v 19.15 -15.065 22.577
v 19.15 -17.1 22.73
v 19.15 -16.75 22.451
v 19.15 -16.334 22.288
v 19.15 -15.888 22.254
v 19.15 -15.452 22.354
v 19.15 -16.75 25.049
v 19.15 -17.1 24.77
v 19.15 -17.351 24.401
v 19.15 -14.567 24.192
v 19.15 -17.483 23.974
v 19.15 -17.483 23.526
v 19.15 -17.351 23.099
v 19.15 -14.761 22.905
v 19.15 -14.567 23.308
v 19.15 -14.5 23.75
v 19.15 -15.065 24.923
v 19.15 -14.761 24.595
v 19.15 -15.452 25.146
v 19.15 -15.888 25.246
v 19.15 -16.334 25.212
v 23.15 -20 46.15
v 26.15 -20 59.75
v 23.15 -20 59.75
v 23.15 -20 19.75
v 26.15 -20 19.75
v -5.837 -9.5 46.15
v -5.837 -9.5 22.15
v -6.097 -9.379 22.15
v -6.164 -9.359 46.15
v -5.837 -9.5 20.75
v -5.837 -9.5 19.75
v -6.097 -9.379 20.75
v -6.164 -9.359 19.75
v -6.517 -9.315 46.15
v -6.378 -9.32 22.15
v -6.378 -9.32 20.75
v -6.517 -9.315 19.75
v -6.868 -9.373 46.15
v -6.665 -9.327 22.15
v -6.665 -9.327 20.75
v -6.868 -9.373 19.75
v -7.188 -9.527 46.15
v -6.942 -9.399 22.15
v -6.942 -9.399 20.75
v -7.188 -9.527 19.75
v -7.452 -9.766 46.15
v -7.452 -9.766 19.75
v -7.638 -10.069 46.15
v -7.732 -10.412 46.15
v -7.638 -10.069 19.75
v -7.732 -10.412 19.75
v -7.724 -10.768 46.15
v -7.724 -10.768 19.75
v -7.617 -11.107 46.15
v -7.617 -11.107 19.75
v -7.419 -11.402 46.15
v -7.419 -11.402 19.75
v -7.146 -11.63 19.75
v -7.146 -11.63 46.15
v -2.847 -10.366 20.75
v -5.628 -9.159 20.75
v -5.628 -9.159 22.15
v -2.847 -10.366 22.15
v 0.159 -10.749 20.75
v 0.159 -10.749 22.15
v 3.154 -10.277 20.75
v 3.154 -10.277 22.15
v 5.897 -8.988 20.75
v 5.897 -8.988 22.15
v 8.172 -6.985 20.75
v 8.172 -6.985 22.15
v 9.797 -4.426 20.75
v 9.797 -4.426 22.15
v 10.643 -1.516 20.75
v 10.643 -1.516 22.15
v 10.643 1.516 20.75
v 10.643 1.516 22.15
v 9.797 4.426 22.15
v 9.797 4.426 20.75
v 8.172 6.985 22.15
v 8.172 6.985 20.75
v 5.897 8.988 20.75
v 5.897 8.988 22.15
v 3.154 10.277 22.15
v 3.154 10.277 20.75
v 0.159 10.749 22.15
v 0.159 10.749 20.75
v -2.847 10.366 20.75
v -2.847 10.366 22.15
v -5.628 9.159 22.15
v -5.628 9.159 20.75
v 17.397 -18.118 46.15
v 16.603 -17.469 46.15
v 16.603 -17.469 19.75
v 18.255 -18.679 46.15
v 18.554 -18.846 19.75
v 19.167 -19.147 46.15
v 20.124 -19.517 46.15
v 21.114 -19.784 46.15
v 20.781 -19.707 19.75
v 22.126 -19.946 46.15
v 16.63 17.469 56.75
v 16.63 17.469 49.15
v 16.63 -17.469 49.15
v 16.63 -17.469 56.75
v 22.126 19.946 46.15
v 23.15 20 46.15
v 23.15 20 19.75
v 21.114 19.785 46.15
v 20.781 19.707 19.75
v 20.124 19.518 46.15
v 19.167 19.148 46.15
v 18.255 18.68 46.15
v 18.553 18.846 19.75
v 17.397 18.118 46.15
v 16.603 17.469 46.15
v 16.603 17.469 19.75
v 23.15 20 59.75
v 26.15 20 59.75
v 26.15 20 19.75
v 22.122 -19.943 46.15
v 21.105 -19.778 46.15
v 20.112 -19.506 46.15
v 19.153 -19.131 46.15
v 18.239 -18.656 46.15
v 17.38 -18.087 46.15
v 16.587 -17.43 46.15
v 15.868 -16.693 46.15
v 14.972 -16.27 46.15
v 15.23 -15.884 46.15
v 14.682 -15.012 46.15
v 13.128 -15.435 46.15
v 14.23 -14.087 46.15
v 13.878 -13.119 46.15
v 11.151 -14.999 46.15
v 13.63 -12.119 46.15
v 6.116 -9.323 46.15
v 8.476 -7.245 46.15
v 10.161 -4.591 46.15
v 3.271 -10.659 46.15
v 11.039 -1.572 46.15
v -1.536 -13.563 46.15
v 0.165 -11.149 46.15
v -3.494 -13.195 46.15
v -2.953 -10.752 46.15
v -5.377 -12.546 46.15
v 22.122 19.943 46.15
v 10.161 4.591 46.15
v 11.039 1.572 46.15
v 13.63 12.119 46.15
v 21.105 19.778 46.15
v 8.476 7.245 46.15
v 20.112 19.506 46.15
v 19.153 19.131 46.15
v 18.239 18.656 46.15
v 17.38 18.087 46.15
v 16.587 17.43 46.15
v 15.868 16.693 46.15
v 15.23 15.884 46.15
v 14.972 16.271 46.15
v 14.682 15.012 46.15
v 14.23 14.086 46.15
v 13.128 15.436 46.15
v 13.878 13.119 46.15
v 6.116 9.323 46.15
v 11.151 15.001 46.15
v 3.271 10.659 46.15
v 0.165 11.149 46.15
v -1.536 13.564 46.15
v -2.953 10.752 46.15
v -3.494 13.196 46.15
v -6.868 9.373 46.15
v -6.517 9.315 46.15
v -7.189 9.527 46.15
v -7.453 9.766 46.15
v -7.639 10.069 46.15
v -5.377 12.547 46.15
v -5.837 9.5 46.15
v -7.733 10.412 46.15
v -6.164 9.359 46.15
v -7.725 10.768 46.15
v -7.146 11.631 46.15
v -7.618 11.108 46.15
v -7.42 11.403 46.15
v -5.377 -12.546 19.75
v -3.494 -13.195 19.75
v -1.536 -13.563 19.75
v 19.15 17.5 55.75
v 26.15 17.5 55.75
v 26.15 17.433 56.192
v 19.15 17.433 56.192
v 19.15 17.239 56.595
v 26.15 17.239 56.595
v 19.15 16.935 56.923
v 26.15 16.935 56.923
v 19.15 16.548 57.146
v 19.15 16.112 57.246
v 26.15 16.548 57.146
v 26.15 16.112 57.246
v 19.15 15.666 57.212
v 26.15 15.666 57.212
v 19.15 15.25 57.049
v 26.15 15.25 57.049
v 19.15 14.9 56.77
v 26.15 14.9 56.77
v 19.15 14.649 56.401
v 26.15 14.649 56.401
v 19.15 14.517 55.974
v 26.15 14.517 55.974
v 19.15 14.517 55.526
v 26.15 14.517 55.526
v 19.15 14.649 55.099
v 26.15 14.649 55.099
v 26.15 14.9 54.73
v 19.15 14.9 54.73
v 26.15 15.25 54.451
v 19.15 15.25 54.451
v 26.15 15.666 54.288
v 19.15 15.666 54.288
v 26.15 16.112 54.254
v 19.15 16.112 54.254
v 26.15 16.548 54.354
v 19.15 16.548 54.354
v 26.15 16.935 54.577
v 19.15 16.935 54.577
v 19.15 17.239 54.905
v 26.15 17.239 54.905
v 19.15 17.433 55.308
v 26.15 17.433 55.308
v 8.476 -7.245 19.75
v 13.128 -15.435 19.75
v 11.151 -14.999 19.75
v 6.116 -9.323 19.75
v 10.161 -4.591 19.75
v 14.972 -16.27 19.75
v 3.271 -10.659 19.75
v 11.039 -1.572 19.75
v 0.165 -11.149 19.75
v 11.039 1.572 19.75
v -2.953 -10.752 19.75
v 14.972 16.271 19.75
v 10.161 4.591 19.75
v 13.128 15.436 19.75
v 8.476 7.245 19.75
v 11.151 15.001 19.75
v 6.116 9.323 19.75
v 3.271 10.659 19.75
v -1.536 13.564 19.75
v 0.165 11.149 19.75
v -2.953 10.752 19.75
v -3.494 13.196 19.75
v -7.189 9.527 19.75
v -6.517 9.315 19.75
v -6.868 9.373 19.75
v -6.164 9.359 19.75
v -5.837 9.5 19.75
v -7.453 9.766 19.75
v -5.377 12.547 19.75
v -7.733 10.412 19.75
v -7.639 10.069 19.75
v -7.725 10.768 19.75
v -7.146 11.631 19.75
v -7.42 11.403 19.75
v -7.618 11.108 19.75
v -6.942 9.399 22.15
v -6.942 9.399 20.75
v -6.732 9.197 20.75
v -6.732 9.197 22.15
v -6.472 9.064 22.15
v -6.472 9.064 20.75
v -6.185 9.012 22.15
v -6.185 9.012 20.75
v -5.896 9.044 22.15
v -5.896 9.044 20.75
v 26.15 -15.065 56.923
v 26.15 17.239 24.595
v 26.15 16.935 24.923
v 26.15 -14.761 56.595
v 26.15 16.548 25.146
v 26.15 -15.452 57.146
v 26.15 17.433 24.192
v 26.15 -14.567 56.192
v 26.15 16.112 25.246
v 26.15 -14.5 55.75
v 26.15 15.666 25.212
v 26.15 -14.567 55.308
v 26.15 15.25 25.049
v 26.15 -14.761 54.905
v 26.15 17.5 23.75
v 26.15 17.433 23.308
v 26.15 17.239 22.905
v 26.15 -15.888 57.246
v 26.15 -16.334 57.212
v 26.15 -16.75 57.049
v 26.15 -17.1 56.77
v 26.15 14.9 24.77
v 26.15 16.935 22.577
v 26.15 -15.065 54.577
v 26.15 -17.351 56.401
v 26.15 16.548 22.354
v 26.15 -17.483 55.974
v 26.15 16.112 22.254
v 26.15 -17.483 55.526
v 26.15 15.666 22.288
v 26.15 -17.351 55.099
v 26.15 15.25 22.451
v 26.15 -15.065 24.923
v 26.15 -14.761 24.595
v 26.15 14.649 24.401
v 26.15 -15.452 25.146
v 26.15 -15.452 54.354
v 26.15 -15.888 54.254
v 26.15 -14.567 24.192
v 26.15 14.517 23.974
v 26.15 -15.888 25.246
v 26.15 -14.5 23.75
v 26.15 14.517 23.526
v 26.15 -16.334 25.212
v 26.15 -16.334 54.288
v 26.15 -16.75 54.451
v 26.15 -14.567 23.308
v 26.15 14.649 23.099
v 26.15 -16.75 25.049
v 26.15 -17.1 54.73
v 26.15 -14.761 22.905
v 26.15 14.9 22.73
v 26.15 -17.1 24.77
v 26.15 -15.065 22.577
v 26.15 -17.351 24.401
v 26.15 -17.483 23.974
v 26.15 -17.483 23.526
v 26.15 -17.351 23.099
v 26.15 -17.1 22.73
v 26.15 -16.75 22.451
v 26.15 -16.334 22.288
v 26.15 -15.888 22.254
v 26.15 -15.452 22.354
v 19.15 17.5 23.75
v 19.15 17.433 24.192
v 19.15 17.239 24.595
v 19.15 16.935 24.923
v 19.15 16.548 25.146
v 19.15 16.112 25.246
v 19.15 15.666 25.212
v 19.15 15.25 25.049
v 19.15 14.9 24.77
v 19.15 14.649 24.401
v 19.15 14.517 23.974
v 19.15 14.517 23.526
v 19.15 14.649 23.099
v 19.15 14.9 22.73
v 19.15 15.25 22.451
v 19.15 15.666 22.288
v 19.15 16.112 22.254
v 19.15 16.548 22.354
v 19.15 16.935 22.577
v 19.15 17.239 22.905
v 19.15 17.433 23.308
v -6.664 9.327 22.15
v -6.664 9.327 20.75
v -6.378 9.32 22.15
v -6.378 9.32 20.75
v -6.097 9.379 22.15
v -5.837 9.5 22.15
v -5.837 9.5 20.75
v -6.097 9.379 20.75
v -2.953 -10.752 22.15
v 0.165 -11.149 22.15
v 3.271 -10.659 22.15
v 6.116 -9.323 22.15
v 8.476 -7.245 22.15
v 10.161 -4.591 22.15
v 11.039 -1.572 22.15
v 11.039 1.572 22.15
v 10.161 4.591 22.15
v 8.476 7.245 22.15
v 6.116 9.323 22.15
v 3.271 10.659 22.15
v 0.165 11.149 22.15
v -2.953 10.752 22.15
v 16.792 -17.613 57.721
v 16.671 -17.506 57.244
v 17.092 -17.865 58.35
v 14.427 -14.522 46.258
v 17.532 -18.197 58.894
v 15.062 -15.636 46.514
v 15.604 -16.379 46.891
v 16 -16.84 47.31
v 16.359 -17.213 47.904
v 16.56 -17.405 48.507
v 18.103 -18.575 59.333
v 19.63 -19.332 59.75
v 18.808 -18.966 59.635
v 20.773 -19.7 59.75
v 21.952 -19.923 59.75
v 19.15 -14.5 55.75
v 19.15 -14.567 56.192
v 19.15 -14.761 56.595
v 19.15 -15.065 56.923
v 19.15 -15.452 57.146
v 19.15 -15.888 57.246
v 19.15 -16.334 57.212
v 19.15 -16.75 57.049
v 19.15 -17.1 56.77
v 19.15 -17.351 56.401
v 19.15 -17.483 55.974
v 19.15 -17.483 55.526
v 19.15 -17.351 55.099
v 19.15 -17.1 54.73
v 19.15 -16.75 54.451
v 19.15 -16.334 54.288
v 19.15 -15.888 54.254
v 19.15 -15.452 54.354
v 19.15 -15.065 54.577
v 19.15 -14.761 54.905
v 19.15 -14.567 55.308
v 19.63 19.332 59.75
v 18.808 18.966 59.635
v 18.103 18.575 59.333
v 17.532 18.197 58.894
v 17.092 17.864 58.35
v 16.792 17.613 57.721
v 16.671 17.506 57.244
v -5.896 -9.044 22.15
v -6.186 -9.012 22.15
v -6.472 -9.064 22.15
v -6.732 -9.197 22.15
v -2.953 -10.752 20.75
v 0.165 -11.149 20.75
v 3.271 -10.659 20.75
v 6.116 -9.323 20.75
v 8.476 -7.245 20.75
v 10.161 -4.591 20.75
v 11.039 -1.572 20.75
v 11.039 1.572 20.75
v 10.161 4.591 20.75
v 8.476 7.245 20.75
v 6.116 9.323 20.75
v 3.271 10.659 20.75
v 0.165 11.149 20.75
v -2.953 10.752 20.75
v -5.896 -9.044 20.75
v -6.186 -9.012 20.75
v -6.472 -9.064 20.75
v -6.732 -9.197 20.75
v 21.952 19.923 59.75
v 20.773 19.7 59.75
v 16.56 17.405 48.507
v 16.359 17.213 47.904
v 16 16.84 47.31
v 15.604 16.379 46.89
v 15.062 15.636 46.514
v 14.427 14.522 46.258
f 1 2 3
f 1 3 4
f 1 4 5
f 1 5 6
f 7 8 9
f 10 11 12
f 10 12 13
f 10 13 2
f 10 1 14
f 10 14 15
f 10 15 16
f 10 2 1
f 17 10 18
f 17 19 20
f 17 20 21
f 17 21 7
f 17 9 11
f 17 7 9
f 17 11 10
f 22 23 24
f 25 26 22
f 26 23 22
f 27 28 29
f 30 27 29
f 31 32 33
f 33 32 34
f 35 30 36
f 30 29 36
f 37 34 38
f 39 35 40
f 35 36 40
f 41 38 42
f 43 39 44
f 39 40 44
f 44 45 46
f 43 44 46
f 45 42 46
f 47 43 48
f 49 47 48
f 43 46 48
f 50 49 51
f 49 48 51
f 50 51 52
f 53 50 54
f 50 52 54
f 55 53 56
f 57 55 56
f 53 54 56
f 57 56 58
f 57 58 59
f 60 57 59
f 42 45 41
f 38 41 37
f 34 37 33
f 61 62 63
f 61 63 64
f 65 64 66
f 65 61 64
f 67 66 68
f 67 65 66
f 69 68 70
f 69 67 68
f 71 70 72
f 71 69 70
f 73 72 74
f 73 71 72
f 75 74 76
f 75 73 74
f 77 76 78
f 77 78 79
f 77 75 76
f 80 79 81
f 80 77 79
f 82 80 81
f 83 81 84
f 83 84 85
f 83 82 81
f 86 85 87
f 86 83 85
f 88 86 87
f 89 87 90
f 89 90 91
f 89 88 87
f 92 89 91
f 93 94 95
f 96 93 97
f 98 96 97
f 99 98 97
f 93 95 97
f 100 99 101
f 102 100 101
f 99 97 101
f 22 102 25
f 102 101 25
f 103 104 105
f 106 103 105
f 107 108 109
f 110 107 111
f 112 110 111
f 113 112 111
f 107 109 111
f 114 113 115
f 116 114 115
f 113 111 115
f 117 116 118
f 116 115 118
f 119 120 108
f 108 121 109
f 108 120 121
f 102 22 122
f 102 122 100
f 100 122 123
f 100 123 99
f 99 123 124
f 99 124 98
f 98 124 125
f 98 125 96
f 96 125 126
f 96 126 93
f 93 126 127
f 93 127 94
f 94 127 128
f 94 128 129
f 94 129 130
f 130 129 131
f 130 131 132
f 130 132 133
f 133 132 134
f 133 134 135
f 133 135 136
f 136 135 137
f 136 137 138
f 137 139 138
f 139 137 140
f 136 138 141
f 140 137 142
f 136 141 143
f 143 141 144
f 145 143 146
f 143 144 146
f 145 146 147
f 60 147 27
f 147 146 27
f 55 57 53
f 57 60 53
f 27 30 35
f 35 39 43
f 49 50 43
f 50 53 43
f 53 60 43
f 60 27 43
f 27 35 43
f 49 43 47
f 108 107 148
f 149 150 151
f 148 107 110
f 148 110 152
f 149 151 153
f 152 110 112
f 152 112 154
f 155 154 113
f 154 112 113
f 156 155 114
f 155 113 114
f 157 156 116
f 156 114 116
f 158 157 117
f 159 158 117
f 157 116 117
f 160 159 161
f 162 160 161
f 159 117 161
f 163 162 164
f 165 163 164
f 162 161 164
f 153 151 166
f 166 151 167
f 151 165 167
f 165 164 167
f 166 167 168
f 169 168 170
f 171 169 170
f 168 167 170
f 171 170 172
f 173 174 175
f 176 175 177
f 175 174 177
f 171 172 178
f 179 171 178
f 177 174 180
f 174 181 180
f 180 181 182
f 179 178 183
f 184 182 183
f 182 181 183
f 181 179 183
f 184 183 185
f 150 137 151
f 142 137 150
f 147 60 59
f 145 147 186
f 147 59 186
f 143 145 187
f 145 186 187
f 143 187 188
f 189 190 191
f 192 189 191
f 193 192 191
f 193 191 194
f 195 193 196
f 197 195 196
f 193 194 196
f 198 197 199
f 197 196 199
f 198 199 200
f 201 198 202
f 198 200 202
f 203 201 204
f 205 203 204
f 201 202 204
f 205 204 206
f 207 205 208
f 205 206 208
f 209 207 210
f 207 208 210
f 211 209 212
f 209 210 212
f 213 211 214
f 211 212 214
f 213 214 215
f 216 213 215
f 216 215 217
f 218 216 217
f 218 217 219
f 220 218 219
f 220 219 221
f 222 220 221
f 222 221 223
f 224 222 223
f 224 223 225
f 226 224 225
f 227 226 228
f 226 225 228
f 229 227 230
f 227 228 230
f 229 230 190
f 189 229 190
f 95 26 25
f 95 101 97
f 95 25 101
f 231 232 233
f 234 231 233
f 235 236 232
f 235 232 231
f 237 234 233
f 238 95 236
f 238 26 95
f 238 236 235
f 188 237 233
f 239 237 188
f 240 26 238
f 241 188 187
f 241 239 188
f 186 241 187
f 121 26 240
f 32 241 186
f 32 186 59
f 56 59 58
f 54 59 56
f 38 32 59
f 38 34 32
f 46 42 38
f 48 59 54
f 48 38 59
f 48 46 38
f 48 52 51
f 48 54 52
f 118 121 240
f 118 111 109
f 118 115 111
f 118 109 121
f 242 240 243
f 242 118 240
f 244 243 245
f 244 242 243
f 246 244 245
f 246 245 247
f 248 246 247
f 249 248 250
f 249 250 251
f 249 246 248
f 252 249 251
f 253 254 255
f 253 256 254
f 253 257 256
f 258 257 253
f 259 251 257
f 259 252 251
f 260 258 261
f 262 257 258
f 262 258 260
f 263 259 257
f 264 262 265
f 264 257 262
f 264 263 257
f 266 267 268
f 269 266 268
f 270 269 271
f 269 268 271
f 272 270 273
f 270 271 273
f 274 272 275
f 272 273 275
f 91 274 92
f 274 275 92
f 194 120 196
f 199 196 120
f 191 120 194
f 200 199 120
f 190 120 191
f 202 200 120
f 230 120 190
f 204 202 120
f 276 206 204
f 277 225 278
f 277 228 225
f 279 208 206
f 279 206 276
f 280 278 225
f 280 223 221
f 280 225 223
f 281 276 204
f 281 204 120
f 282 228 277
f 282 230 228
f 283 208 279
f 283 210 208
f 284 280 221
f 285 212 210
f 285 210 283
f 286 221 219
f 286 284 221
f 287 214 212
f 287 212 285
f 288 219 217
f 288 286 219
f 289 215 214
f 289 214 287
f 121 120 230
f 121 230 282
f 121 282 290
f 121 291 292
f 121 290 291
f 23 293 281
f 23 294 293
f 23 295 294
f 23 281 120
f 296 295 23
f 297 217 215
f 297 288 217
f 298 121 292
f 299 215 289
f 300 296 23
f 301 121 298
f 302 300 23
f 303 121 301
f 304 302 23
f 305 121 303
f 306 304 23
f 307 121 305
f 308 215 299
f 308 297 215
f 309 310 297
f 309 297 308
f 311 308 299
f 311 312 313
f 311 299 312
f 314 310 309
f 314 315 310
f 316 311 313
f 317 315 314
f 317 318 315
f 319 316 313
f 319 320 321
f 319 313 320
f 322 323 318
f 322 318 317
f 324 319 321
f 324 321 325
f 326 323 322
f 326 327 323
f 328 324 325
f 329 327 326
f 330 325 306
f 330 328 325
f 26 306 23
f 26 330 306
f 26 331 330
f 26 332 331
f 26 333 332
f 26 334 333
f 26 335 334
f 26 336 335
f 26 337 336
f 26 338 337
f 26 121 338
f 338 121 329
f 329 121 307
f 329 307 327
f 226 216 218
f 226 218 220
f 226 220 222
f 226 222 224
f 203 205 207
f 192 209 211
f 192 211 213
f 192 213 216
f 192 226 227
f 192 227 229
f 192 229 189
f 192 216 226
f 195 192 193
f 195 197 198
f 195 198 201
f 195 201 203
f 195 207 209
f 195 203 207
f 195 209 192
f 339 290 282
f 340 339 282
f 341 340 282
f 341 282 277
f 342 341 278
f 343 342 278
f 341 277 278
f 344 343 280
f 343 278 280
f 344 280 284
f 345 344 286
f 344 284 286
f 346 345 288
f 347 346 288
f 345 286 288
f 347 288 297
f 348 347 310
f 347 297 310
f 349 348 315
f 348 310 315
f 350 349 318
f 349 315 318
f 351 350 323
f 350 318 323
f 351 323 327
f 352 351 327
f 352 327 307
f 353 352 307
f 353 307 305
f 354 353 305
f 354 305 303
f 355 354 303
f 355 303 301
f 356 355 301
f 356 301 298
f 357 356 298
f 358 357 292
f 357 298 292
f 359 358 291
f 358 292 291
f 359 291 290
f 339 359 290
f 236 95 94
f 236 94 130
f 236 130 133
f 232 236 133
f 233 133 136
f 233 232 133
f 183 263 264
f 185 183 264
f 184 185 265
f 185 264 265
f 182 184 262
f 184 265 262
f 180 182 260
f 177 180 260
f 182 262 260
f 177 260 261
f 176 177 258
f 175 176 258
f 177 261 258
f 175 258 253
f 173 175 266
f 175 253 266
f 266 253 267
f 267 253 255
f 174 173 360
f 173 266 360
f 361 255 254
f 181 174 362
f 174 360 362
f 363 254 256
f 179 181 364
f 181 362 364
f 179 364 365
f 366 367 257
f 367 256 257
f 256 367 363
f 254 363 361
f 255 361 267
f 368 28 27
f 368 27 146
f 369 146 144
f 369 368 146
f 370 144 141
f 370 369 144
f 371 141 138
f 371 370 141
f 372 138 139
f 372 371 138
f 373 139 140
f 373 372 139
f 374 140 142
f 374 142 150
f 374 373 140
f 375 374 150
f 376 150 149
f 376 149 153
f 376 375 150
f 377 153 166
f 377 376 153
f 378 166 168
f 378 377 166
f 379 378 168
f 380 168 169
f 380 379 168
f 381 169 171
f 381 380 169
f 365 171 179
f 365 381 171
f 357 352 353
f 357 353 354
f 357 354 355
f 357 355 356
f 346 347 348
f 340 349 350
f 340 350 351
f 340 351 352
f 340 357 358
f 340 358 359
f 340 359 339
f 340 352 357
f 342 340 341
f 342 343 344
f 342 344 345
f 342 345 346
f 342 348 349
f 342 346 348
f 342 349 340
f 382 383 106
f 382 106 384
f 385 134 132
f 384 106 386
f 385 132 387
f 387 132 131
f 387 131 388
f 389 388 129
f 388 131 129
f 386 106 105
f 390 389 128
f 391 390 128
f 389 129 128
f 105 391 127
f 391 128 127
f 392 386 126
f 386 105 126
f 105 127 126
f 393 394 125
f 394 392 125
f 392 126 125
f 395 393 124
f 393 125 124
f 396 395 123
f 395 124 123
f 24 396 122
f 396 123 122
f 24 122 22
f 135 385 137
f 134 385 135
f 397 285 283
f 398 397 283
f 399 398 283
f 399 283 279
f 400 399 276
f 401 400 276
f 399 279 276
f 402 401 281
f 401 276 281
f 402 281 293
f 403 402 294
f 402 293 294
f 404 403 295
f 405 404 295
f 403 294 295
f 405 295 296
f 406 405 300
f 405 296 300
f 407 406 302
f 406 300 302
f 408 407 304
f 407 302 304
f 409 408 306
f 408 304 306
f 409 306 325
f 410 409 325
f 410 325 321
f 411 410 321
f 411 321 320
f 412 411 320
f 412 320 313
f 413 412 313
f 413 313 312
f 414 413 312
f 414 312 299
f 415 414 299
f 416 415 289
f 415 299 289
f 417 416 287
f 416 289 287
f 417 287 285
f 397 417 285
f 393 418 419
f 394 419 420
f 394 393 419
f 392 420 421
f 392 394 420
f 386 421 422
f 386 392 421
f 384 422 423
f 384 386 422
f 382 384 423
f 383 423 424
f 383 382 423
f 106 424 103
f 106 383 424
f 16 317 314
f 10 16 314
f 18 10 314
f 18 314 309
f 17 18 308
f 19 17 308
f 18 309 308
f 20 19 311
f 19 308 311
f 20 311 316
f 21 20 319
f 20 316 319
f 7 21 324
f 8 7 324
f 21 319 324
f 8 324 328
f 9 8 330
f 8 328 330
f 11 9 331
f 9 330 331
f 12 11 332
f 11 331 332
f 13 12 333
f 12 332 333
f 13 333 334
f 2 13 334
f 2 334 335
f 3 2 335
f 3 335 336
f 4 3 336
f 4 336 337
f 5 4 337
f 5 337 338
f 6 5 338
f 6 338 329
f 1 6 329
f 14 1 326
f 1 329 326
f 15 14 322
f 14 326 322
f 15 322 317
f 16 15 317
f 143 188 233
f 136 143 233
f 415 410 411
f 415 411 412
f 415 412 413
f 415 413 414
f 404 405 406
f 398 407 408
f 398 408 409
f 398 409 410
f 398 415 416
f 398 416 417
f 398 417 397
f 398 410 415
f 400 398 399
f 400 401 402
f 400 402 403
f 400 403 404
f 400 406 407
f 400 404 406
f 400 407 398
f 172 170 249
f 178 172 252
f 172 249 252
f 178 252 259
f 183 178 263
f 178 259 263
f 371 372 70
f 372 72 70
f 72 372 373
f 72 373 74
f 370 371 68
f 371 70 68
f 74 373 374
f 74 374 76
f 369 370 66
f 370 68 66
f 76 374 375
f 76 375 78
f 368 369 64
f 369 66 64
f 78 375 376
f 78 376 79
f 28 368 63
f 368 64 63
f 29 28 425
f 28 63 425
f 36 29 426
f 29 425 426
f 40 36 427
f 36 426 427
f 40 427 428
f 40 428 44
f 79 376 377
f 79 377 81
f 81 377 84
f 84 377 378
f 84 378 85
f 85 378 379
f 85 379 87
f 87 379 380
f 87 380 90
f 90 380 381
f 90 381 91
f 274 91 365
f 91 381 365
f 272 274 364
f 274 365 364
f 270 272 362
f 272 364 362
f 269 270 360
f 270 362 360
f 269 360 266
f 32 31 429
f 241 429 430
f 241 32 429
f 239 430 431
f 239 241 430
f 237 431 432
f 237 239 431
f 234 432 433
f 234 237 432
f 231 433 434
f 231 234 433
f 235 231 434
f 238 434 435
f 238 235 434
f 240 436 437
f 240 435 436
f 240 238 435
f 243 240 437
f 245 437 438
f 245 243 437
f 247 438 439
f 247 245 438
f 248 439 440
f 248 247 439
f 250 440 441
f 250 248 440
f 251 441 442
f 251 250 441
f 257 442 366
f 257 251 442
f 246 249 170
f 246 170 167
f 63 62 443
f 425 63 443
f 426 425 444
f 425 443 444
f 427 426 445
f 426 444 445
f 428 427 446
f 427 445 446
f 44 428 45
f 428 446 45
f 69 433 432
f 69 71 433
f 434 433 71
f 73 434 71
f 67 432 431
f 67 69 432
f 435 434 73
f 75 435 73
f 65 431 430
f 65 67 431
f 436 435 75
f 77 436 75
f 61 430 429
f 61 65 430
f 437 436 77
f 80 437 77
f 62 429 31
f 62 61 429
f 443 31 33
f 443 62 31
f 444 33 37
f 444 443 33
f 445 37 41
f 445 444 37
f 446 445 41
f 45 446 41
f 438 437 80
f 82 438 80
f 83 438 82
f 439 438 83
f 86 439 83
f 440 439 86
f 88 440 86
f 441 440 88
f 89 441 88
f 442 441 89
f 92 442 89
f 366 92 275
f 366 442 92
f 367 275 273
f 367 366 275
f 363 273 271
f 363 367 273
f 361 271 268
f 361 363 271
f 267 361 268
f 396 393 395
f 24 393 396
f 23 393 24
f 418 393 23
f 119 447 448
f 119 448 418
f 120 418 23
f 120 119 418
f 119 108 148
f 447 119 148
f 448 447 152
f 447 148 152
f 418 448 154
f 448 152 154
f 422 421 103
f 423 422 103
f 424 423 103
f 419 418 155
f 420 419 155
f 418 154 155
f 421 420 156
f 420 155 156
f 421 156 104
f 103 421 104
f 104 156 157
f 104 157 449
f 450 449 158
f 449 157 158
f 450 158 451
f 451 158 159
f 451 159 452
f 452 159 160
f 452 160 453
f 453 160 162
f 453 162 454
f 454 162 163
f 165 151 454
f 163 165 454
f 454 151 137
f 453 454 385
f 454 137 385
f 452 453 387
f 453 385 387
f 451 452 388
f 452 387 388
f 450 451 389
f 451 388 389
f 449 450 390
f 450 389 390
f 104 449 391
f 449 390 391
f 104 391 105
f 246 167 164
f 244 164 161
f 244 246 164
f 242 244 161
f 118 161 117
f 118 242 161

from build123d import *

# Parameters (mm, degrees)
PAD001_DEPTH = 1.4
PAD_DEPTH    = 26.4
PAD002_DEPTH = 13.6
FILLET_R     = 3
SKETCH029_R  = 1.5
POCKET_DEPTH = 7


with BuildPart() as pad001:
    # Sketch001 → Pad001 (new body)
    with BuildSketch(Plane.XY.offset(1)):
        with BuildLine():
            ThreePointArc((-5.627749, -9.1592), (10.75, 0), (-5.627749, 9.1592))
            ThreePointArc((-6.674772, 10.863237), (-7.003279, 9.487707), (-5.627749, 9.1592))
            ThreePointArc((-6.674778, -10.863233), (12.75, -4e-06), (-6.674772, 10.863237))
            ThreePointArc((-5.627749, -9.1592), (-7.003277, -9.487704), (-6.674778, -10.863233))
        make_face()
    extrude(amount=PAD001_DEPTH)


with BuildPart() as mainblock003:
    # Sketch → Pad (new body)
    with BuildSketch(Plane.XY):
        with BuildLine():
            ThreePointArc((-5.837167, -9.499999), (11.15, -4e-06), (-5.83716, 9.500003))
            ThreePointArc((-7.146244, 11.630572), (-7.556981, 9.910749), (-5.83716, 9.500003))
            ThreePointArc((-1.535936, 13.563919), (-4.447417, 12.905792), (-7.146244, 11.630572))
            Line((-1.535936, 13.563919), (11.151047, 15.000553))
            ThreePointArc((11.151047, 15.000553), (14.071423, 15.805596), (16.602936, 17.469367))
            ThreePointArc((23.150107, 20), (19.640497, 19.345319), (16.602936, 17.469367))
            Line((26.150107, 20), (23.150107, 20))
            Line((26.150107, 20), (26.150107, -20))
            Line((26.150107, -20), (23.150107, -20))
            ThreePointArc((16.603443, -17.468808), (19.640708, -19.344966), (23.150107, -20))
            ThreePointArc((16.603443, -17.468808), (14.071743, -15.804671), (11.151047, -14.999447))
            Line((-1.535936, -13.562681), (11.151047, -14.999447))
            ThreePointArc((-7.145609, -11.629518), (-4.447087, -12.904605), (-1.535936, -13.562681))
            ThreePointArc((-5.837167, -9.499999), (-7.556142, -9.910541), (-7.145609, -11.629518))
        make_face()
    extrude(amount=PAD_DEPTH)

    # Sketch005 → Pad002 (new body)
    with BuildSketch(Plane.XY.offset(26.4)):
        with BuildLine():
            ThreePointArc((23.150107, 20), (19.654391, 19.341825), (16.630025, 17.469276))
            Line((16.630025, 17.469276), (16.630025, -17.469302))
            ThreePointArc((16.630025, -17.469302), (19.654393, -19.341837), (23.150107, -20))
            Line((26.150107, -20), (23.150107, -20))
            Line((26.150107, 20), (26.150107, -20))
            Line((26.150107, 20), (23.150107, 20))
        make_face()
    extrude(amount=PAD002_DEPTH)

    # Fillet
    fillet_edges = [mainblock003.edges().sort_by_distance(p)[0] for p in [
        (16.630025, -1.3e-05, 40),
        (16.630025, -1.3e-05, 26.4),
    ]]
    fillet(fillet_edges, radius=FILLET_R)

    # Fusion: union Pad001
    add(pad001.part)


with BuildPart() as mainblock003_1:
    # Fusion placement: moved
    add(mainblock003.part.moved(Location((0, 0, 19.75))))

    # Sketch029 → Pocket (cut)
    with BuildSketch(Plane(origin=(26.150107, 0, 19.75), x_dir=(0, 1, 0), z_dir=(1, 0, 0))):
        with Locations((-16, 36)):
            Circle(SKETCH029_R)
        with Locations((16, 36)):
            Circle(SKETCH029_R)
        with Locations((16, 4)):
            Circle(SKETCH029_R)
        with Locations((-16, 4)):
            Circle(SKETCH029_R)
    extrude(amount=-POCKET_DEPTH, mode=Mode.SUBTRACT)


solid = mainblock003_1.part
